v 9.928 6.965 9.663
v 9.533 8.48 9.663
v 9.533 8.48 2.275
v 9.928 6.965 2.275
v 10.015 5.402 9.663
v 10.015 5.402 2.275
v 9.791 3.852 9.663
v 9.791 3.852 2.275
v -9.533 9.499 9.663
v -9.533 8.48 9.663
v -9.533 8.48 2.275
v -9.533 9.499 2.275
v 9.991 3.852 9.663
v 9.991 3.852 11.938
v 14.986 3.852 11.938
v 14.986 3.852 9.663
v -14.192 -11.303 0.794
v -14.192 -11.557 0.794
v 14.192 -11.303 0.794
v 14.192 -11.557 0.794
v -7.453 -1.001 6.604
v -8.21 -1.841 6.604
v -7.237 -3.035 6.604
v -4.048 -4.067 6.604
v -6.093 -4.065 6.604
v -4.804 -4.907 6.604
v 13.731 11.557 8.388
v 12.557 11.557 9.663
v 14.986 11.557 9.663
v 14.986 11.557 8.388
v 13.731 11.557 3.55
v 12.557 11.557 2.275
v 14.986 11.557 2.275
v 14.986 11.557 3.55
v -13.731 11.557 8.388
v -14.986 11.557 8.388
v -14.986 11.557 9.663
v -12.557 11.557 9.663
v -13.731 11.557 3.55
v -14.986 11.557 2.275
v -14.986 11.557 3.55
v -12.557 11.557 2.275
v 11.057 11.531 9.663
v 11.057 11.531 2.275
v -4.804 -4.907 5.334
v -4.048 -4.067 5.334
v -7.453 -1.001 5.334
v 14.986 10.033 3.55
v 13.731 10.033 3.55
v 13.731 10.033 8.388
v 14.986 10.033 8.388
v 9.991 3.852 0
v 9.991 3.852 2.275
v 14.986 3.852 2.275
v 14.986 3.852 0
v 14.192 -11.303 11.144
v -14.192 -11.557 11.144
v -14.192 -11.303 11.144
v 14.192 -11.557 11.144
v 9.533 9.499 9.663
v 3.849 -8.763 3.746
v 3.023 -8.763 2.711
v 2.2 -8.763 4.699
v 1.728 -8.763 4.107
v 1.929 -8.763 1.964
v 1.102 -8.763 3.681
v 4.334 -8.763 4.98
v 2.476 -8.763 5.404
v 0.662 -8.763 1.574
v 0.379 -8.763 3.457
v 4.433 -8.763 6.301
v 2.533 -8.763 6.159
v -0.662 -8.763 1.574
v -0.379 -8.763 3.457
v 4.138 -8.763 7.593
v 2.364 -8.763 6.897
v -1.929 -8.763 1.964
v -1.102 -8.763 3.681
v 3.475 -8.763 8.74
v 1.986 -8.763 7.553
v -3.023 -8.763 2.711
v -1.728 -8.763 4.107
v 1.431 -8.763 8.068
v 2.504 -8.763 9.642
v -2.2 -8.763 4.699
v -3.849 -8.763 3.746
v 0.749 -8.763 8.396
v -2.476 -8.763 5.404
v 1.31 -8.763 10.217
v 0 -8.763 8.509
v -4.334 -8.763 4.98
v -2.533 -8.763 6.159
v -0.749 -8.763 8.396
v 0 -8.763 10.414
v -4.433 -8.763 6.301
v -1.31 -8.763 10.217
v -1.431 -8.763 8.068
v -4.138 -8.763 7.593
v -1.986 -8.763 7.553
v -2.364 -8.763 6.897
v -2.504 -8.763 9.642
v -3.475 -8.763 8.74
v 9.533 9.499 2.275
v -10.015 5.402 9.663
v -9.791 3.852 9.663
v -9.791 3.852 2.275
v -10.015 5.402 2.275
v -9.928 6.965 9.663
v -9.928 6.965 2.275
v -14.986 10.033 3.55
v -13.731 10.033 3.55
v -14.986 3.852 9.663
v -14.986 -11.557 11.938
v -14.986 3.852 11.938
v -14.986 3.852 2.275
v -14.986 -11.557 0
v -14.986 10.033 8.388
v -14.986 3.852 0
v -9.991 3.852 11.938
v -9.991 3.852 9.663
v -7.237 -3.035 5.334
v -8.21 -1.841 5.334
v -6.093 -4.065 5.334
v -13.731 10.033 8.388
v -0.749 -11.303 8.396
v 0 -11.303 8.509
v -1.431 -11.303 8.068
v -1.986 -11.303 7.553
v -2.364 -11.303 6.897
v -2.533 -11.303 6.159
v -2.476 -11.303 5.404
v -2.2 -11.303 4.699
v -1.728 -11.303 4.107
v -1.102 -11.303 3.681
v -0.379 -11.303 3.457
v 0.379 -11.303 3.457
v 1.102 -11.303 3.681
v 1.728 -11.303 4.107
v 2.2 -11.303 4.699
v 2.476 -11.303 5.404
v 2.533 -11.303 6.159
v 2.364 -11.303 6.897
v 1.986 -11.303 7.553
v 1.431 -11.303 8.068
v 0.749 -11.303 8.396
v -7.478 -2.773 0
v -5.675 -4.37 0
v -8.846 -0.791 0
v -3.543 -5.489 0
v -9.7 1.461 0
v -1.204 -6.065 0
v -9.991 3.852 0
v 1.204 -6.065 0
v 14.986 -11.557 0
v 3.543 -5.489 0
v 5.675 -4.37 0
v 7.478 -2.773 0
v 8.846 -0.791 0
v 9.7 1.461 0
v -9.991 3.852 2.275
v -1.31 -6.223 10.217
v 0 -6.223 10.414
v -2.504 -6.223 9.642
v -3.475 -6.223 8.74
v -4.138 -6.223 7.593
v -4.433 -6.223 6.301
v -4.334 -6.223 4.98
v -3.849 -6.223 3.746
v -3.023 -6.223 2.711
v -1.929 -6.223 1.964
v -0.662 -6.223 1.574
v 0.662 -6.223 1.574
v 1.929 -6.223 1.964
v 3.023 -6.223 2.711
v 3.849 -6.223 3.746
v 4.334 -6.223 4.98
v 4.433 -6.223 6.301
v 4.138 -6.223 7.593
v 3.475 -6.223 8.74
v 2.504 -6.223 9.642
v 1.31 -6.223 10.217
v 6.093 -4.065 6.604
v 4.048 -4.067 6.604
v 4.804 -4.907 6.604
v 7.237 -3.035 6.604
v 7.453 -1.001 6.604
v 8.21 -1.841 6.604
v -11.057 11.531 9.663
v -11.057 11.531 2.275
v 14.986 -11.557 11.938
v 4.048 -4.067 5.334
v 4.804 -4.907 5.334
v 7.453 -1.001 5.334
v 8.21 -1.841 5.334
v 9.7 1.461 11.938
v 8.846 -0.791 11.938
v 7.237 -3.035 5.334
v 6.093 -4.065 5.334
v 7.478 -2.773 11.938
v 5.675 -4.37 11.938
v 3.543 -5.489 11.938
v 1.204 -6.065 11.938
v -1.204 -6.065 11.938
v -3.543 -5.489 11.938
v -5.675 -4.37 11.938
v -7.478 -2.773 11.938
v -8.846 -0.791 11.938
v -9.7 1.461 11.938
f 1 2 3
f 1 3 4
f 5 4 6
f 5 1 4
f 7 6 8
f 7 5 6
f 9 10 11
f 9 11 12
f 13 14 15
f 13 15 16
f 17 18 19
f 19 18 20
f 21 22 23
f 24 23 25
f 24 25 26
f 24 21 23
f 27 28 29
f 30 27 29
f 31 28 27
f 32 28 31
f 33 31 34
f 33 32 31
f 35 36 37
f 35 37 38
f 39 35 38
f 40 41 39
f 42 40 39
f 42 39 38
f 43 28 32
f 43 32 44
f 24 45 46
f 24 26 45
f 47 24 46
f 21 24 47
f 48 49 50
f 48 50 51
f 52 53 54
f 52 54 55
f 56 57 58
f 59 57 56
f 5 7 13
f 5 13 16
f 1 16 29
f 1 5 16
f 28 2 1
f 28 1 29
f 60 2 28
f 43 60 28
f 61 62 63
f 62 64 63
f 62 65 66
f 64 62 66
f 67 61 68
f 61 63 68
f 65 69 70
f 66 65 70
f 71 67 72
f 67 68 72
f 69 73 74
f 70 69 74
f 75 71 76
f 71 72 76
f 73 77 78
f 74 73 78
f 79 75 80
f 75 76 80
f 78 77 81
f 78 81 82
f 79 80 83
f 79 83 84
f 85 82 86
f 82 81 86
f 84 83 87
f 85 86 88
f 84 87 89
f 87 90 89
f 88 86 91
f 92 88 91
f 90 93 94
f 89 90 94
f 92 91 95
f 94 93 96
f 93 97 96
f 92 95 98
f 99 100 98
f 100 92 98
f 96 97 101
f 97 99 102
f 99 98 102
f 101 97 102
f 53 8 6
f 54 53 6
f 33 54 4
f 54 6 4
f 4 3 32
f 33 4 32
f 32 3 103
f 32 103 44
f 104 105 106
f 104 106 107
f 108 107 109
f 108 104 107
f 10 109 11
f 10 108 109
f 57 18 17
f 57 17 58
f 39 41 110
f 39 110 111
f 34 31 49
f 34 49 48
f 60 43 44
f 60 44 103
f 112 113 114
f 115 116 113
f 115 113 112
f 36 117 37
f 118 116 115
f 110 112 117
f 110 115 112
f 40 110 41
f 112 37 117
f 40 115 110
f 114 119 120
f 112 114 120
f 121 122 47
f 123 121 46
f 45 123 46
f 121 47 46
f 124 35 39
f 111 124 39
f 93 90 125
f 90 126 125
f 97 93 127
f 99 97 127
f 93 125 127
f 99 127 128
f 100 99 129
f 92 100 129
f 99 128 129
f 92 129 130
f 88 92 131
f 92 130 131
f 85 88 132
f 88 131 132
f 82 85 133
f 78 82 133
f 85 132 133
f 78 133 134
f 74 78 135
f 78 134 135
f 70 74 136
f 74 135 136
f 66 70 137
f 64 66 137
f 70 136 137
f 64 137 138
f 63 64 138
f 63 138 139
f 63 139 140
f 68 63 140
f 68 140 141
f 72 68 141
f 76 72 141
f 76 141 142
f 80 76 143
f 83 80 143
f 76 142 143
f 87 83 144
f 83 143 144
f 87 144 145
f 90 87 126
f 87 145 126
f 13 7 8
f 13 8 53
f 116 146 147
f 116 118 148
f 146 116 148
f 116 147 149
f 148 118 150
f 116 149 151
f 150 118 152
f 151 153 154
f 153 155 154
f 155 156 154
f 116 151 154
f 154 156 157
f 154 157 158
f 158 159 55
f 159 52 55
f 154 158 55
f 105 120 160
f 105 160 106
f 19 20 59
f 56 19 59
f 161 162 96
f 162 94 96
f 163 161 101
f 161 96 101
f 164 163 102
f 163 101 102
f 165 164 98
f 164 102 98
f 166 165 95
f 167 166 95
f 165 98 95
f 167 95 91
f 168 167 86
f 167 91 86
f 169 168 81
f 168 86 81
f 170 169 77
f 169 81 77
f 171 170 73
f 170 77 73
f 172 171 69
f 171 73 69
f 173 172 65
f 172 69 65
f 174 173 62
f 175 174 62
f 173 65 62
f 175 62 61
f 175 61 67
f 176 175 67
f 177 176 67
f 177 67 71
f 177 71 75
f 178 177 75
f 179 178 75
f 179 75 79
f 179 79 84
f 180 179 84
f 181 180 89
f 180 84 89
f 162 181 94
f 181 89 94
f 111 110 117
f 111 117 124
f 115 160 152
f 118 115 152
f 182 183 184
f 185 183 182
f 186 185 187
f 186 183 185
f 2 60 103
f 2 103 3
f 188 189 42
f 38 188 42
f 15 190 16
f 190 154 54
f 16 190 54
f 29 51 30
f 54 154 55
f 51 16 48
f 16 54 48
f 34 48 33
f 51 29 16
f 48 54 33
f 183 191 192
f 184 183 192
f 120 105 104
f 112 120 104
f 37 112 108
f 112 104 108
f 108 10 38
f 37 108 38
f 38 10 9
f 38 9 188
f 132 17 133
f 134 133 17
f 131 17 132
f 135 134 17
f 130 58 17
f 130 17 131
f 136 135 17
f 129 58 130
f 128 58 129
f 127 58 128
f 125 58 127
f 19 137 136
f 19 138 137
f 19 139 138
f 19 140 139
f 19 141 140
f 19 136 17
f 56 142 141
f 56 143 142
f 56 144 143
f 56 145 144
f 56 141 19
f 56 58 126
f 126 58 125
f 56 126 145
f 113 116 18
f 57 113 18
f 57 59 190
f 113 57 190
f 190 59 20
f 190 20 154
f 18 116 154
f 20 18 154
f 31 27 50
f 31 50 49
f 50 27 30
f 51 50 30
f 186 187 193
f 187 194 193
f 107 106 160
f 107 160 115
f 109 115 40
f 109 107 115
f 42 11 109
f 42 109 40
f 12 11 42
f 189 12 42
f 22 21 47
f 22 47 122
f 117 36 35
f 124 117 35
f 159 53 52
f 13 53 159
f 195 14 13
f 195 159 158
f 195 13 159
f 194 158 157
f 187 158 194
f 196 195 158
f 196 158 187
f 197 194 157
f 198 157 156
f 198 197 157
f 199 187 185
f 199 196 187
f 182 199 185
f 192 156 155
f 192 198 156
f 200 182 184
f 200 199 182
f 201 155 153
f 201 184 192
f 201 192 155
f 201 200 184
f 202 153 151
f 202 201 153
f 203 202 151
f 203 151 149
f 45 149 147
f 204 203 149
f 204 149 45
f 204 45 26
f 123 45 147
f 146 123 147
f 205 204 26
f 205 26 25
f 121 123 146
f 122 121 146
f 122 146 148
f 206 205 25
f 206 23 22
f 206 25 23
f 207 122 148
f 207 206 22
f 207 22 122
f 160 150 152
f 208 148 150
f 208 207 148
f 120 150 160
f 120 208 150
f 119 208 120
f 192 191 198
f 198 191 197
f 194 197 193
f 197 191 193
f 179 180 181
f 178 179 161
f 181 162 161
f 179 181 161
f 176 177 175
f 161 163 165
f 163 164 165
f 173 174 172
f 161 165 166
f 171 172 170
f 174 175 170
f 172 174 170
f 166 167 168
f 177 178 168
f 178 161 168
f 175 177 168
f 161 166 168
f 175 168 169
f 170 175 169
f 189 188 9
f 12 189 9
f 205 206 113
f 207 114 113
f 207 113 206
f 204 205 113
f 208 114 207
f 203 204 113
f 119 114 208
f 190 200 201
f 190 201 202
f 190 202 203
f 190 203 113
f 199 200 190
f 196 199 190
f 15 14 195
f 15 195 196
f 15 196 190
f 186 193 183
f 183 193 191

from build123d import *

# Parameters (mm, degrees)
SKETCH1_W               = 29.972
SKETCH1_H               = 23.114
EXTRUDE1_DEPTH          = 11.938
CUT_EXTRUDE1_DEPTH      = 12.938
SKETCH3_W               = 2.27457
SKETCH3_H               = 7.704666667
CUT_EXTRUDE2_DEPTH      = 15.986
CUT_EXTRUDE2_DEPTH_BACK = 15.986
SKETCH4_W               = 28.3845
SKETCH4_H               = 10.3505
CUT_EXTRUDE3_DEPTH      = 0.254
SKETCH5_W               = 1.255132872
SKETCH5_H               = 4.83743
CUT_EXTRUDE4_DEPTH      = 1.524
EXTRUDE2_DEPTH          = 0.635
CUT_EXTRUDE5_DEPTH      = 10.66343


with BuildPart() as part:
    # Sketch1 → Extrude1 (new body)
    with BuildSketch(Plane.XY):
        Rectangle(SKETCH1_W, SKETCH1_H)
    extrude(amount=EXTRUDE1_DEPTH)

    # Sketch2 → Cut-Extrude1 (cut, through all)
    with BuildSketch(Plane.XY.offset(11.938)):
        with BuildLine():
            Line((-9.990666667, 3.852333333), (-9.790853333, 3.852333333))
            ThreePointArc((-9.790853333, 3.852333333), (-10.010454448, 6.185541418), (-9.5329375, 8.479895833))
            Line((-9.5329375, 8.479895833), (-9.5329375, 11.504083333))
            Line((-9.5329375, 11.504083333), (-12.557125, 11.557))
            Line((-12.557125, 11.557), (12.557125, 11.557))
            Line((12.557125, 11.557), (9.5329375, 11.504083333))
            Line((9.5329375, 11.504083333), (9.5329375, 8.479895833))
            ThreePointArc((9.5329375, 8.479895833), (10.010454448, 6.185541418), (9.790853333, 3.852333333))
            Line((9.790853333, 3.852333333), (9.990666667, 3.852333333))
            ThreePointArc((9.990666667, 3.852333333), (0, -6.138333333), (-9.990666667, 3.852333333))
        make_face()
    extrude(amount=-CUT_EXTRUDE1_DEPTH, mode=Mode.SUBTRACT)

    # Sketch3 → Cut-Extrude2 (cut, two sides)
    with BuildSketch(Plane(origin=(0, 0, 0), x_dir=(0, 0, -1), z_dir=(1, 0, 0))) as cut_extrude2_sk:
        with Locations((-10.800715, 7.704666667)):
            Rectangle(SKETCH3_W, SKETCH3_H)
        with Locations((-1.137285, 7.704666667)):
            Rectangle(SKETCH3_W, SKETCH3_H)
    extrude(amount=CUT_EXTRUDE2_DEPTH, mode=Mode.SUBTRACT)
    extrude(cut_extrude2_sk.sketch, amount=-CUT_EXTRUDE2_DEPTH_BACK, mode=Mode.SUBTRACT)

    # Sketch4 → Cut-Extrude3 (cut)
    with BuildSketch(Plane.XZ.offset(11.557)):
        with Locations((0, 5.969)):
            Rectangle(SKETCH4_W, SKETCH4_H)
    extrude(amount=-CUT_EXTRUDE3_DEPTH, mode=Mode.SUBTRACT)

    # Sketch5 → Cut-Extrude4 (cut)
    with BuildSketch(Plane(origin=(0, 11.557, 0), x_dir=(1, 0, 0), z_dir=(0, 1, 0))):
        with Locations((-14.358433564, -5.969)):
            Rectangle(SKETCH5_W, SKETCH5_H)
        with Locations((14.358433564, -5.969)):
            Rectangle(SKETCH5_W, SKETCH5_H)
    extrude(amount=-CUT_EXTRUDE4_DEPTH, mode=Mode.SUBTRACT)

    # Sketch6 → Cut-Revolve1 (revolve, cut)
    with BuildSketch(Plane(origin=(0, 0, 5.969), x_dir=(-1, 0, 0), z_dir=(0, 0, -1)), mode=Mode.PRIVATE) as cut_revolve1_sk:
        Polygon((2.54, -11.303), (0, -11.303), (0, -6.223), (4.445, -6.223), (4.445, -8.763), (2.54, -8.763), align=None)
    revolve(cut_revolve1_sk.sketch.rotate(Axis((0, 0, 5.969), (0, -1, 0)), 270), axis=Axis((0, 0, 5.969), (0, -1, 0)), mode=Mode.SUBTRACT)  # turned: the seam where the file's is

    # Sketch7 → Extrude2 (add, symmetric)
    with BuildSketch(Plane(origin=(0, 0, 5.969), x_dir=(-1, 0, 0), z_dir=(0, 0, -1))):
        with BuildLine():
            Line((4.047558738, -4.067217721), (7.45308183, -1.000870956))
            Line((7.45308183, -1.000870956), (8.209636208, -1.841109717))
            ThreePointArc((8.209636208, -1.841109717), (6.685060845, -3.572178903), (4.804113117, -4.907456482))
            Line((4.804113117, -4.907456482), (4.047558738, -4.067217721))
        make_face()
        with BuildLine():
            Line((-4.047558738, -4.067217721), (-4.804113117, -4.907456482))
            ThreePointArc((-4.804113117, -4.907456482), (-6.685060845, -3.572178903), (-8.209636208, -1.841109717))
            Line((-8.209636208, -1.841109717), (-7.45308183, -1.000870956))
            Line((-7.45308183, -1.000870956), (-4.047558738, -4.067217721))
        make_face()
    extrude(amount=EXTRUDE2_DEPTH, both=True)

    # Sketch8 → Cut-Extrude5 (cut, through all)
    with BuildSketch(Plane.XY.offset(9.66343)):
        Polygon((-9.5329375, 11.53075), (-11.0569375, 11.53075), (-9.5329375, 9.49875), align=None)
        Polygon((9.5329375, 11.53075), (11.0569375, 11.53075), (9.5329375, 9.49875), align=None)
    extrude(amount=-CUT_EXTRUDE5_DEPTH, mode=Mode.SUBTRACT)


solid = part.part
